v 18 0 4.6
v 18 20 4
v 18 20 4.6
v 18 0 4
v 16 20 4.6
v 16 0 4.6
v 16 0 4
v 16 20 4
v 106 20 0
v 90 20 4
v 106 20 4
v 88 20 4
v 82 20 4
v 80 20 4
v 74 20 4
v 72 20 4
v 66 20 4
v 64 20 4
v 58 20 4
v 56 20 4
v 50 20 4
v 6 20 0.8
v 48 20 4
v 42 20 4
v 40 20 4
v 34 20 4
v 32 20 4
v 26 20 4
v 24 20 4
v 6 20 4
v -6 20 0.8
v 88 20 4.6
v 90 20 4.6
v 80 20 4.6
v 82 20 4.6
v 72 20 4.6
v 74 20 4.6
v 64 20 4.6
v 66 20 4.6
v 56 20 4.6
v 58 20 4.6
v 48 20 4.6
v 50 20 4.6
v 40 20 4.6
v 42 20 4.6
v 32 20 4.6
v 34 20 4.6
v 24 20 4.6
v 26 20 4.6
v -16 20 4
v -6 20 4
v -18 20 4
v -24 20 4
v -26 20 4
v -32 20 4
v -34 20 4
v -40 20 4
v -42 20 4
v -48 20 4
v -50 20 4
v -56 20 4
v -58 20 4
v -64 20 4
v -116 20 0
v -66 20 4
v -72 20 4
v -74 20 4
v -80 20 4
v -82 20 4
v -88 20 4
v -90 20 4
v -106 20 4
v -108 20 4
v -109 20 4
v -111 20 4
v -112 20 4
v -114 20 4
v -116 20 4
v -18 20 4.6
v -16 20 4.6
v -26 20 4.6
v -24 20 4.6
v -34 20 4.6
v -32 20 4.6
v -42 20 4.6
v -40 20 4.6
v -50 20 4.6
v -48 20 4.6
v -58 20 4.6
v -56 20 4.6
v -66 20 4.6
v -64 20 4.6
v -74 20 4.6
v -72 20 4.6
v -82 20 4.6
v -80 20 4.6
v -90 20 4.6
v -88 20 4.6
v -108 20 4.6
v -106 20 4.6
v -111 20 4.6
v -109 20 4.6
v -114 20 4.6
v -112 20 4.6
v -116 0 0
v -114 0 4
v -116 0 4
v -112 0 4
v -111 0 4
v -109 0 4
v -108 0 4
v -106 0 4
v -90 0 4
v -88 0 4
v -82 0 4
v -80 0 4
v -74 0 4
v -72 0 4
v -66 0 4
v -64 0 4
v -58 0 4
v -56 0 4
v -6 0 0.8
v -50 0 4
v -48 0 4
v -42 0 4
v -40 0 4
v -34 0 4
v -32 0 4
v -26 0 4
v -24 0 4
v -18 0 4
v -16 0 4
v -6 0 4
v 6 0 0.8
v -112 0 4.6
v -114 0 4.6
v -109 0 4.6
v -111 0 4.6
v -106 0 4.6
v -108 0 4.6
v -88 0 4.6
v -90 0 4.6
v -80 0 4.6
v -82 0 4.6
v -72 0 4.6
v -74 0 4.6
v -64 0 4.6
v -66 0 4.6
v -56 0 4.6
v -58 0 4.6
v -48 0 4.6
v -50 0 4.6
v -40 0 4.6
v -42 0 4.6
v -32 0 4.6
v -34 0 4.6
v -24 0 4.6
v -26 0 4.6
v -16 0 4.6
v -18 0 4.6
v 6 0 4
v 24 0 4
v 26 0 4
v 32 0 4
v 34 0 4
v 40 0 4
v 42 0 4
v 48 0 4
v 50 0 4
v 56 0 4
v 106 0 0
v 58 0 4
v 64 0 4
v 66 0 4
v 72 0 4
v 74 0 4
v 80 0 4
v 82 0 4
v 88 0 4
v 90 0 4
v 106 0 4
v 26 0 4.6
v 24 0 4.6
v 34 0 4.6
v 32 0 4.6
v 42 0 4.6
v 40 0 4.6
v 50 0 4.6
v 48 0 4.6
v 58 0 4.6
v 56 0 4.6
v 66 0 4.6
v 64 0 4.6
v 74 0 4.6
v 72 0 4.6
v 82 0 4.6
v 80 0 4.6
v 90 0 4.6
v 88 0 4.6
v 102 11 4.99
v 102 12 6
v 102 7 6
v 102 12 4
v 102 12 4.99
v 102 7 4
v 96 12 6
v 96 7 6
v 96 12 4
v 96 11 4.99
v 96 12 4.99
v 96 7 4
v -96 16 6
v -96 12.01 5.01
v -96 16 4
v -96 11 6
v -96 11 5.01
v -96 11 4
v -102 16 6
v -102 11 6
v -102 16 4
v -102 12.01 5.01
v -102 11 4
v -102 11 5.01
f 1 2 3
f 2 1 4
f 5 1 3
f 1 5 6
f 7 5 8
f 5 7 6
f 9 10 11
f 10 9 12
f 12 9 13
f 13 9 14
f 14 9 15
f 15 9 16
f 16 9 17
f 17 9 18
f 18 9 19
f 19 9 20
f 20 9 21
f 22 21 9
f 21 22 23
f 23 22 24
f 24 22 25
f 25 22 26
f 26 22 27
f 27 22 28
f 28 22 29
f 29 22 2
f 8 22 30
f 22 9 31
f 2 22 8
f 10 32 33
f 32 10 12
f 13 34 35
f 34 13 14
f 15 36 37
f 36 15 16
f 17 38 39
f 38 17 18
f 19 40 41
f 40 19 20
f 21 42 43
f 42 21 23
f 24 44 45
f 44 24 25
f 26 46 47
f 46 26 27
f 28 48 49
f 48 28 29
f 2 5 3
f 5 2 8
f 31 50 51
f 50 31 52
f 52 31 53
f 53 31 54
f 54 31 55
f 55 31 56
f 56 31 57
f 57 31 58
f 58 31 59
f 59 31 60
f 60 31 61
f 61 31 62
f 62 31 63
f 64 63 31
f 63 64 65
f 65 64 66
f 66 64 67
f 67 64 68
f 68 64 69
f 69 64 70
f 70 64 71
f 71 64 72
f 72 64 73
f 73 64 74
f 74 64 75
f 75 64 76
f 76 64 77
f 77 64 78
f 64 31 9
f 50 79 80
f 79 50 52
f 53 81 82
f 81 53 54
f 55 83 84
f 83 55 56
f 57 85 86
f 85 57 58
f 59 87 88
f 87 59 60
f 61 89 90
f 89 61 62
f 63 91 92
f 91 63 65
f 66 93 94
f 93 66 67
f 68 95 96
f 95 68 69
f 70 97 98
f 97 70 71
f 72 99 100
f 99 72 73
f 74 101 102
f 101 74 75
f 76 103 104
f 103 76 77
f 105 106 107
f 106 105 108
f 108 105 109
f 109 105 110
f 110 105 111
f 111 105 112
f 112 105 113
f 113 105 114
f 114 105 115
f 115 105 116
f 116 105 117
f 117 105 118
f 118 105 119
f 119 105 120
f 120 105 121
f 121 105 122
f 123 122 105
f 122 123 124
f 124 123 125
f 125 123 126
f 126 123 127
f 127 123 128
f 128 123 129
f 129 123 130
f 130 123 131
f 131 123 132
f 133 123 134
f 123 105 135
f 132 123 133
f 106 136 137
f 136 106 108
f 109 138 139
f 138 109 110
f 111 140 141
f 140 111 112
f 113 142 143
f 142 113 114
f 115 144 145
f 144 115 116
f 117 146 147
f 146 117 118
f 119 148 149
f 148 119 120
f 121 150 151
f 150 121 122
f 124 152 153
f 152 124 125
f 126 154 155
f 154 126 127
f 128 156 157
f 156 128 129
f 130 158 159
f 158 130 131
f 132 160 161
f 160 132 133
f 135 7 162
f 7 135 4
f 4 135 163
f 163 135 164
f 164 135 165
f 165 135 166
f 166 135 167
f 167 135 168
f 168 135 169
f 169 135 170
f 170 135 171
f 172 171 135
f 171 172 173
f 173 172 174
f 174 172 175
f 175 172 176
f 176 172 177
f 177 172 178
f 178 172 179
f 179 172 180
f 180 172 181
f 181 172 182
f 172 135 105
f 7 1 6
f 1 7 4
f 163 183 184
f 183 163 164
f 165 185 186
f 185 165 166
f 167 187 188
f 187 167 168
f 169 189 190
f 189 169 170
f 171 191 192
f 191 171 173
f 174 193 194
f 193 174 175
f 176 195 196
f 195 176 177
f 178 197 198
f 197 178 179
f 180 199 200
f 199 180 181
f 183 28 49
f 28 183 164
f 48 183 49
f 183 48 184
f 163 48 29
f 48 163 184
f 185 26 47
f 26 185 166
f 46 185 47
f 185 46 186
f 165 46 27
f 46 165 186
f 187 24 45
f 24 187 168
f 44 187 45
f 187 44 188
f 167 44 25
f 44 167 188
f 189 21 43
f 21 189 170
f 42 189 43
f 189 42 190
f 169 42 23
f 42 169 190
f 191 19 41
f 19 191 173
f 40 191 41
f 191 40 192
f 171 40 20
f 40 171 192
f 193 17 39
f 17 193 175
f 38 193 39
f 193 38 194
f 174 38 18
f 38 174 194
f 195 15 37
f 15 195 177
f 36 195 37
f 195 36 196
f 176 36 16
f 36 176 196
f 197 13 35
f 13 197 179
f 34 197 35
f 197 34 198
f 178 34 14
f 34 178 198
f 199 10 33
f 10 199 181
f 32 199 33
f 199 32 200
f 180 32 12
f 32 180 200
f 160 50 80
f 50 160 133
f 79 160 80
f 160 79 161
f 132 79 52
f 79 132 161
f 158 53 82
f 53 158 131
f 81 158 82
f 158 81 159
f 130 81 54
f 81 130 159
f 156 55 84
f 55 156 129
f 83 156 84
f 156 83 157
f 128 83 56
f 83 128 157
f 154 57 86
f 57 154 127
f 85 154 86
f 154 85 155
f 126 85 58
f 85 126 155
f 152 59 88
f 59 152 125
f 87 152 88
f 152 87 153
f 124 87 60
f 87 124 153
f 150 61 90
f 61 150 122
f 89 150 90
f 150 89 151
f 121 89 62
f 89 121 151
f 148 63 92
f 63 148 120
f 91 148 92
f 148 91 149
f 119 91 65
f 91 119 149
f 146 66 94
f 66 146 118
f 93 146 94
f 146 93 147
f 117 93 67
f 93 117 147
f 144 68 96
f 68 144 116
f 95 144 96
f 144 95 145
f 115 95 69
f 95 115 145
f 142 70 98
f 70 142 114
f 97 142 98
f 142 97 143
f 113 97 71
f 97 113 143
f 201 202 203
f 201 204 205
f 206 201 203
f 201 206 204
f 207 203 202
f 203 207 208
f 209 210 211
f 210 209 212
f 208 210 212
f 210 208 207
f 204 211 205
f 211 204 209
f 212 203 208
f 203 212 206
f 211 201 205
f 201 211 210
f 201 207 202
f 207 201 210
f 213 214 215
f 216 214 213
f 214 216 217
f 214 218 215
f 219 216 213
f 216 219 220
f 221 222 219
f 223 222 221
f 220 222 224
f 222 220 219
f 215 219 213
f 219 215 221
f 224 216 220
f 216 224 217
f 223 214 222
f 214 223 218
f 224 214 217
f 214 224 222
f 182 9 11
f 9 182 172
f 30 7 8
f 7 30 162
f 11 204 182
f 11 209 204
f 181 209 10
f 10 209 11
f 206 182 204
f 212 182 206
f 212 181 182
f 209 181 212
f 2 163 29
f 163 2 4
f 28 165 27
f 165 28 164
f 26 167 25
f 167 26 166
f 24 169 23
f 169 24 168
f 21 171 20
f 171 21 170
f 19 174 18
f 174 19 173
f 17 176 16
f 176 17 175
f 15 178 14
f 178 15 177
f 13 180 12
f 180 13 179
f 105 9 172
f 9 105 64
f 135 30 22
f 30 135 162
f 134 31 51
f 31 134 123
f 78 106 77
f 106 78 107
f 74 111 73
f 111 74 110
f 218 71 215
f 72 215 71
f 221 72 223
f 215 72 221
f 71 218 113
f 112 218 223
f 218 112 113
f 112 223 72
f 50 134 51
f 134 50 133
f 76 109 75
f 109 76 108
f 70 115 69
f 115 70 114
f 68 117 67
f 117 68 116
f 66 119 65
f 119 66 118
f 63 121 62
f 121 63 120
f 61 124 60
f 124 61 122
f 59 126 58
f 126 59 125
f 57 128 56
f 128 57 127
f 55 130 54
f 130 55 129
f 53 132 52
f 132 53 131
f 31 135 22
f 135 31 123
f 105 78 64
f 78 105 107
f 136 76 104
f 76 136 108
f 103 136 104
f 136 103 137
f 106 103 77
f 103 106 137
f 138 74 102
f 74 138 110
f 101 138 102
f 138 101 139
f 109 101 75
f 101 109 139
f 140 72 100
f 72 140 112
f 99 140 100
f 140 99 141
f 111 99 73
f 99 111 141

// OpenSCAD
// Bag clip with living hinge - PETG, 0.4mm nozzle, no supports
// Printed open flat, closes on 2mm folded bag. Latch hooks shut, thumb tab opens.
// Units: mm. Print orientation: +Z up, rests on z=0.

/* [Parts] */
part = "clip"; // [clip, assembly]

cadverify_only = "";
module instance(name, part, unit = 1) {
    echo(cadverify_instance = [name, part, unit]);
    if (cadverify_only == "" || cadverify_only == name) children();
}

// Parameters
La = 100;      // arm length
W = 20;        // arm width (Y)
Ta = 4;        // arm thickness (Z)
Gh = 12;       // hinge gap in X (-6..6)
Th = 0.8;      // hinge thickness (2x0.4 nozzle)
TabL = 10;     // thumb tab length beyond top arm free end

Xmin = -106 - TabL;  // -116 tab tip
Xmax = 6 + La;       // 106 bottom nose
Ymin = 0; Ymax = W;
Zmin = 0; Zmax = Ta + 2; // 6 latch top

module clip() {
    // bottom arm 6..106
    translate([6, 0, 0]) cube([La, W, Ta]);
    // top arm -106..-6
    translate([-106, 0, 0]) cube([La, W, Ta]);
    // living hinge -6.02..6.02 (overlap into arms), full width, thin
    translate([-Gh/2 - 0.02, 0, 0]) cube([Gh + 0.04, W, Th]);
    // thumb tab -116..-105.98 (overlap into top arm)
    translate([Xmin, 0, 0]) cube([TabL + 0.02, W, Ta]);

    // inner grip teeth 0.6 tall, 2 wide, on inner faces (tops, become inner when closed)
    for (i = [0:9]) translate([16 + i*8, 0, Ta - 0.02]) cube([2, W, 0.62]);
    for (i = [0:9]) translate([-18 - i*8, 0, Ta - 0.02]) cube([2, W, 0.62]);
    // thumb grip ridges on tab top
    translate([-114, 0, Ta - 0.02]) cube([2, W, 0.62]);
    translate([-111, 0, Ta - 0.02]) cube([2, W, 0.62]);
    translate([-108, 0, Ta - 0.02]) cube([2, W, 0.62]);

    // bottom catch block 96..102, 7..12, 3.98..6 with 45deg top-outer chamfer
    difference() {
        translate([96, 7, Ta - 0.02]) cube([6, 5, 2.02]);
        translate([95.99, 0, 11]) rotate([0, 90, 0])
            linear_extrude(height = 6.04)
                polygon(points = [[6.01, 11], [6.01, 12.01], [4.99, 12.01]]);
    }
    // top hook block -102..-96, 11..16, 3.98..6 with 45deg bottom-inner chamfer
    difference() {
        translate([-102, 11, Ta - 0.02]) cube([6, 5, 2.02]);
        translate([-102.02, 0, 9]) rotate([0, 90, 0])
            linear_extrude(height = 6.04)
                polygon(points = [[5.01, 10.99], [3.99, 10.99], [3.99, 12.01]]);
    }
}

module assembly() {
    instance("clip_inst", "clip", 1) clip();
}

if (part == "clip") {
    echo(cadverify_spec = [
        ["bounds", [[Xmin, Ymin, Zmin], [Xmax, Ymax, Zmax]]],
        ["bodies", 1],
        ["support_faces", [["bed", "-z", 4000]]],
        ["overhangs_allowed", []],
        ["copies", 1],
        ["details", [
            ["bottom_arm", "material", [[6, 0, 0], [106, 20, 4]], 0.9],
            ["top_arm", "material", [[-106, 0, 0], [-6, 20, 4]], 0.9],
            ["thumb_tab", "material", [[-116, 0, 0], [-106, 20, 4]], 0.9],
            ["latch_bottom", "material", [[96, 7, 4], [102, 12, 6]], 0.8],
            ["latch_top", "material", [[-102, 11, 4], [-96, 16, 6]], 0.8],
            ["hinge_gap", "void", [[-6, 0, 0.8], [6, 20, 4]], 0.9],
            ["hinge_thin", "thickness", [0, 10, 5], [0, 0, -1], 0.8],
            ["arm_thickness", "thickness", [56, 10, 10], [0, 0, -1], 4.0],
            ["teeth", "view", [[14, 0, 4], [92, 20, 4.8]]],
            ["latch_detail", "view", [[94, 5, 4], [104, 18, 6]]]
        ]]
    ]);
    clip();
} else if (part == "assembly") {
    echo(cadverify_spec = [
        ["bounds", [[Xmin, Ymin, Zmin], [Xmax, Ymax, Zmax]]],
        ["support_faces", [["bed", "-z", 4000]]],
        ["allowed_interferences", []],
        ["motions", [
            ["closing", ["clip_inst"], "slide", [1, 0, 0], [0, 20]]
        ]],
        ["assembly_order", [
            [["clip_inst"], [0, 0, 0]]
        ]]
    ]);
    assembly();
}
